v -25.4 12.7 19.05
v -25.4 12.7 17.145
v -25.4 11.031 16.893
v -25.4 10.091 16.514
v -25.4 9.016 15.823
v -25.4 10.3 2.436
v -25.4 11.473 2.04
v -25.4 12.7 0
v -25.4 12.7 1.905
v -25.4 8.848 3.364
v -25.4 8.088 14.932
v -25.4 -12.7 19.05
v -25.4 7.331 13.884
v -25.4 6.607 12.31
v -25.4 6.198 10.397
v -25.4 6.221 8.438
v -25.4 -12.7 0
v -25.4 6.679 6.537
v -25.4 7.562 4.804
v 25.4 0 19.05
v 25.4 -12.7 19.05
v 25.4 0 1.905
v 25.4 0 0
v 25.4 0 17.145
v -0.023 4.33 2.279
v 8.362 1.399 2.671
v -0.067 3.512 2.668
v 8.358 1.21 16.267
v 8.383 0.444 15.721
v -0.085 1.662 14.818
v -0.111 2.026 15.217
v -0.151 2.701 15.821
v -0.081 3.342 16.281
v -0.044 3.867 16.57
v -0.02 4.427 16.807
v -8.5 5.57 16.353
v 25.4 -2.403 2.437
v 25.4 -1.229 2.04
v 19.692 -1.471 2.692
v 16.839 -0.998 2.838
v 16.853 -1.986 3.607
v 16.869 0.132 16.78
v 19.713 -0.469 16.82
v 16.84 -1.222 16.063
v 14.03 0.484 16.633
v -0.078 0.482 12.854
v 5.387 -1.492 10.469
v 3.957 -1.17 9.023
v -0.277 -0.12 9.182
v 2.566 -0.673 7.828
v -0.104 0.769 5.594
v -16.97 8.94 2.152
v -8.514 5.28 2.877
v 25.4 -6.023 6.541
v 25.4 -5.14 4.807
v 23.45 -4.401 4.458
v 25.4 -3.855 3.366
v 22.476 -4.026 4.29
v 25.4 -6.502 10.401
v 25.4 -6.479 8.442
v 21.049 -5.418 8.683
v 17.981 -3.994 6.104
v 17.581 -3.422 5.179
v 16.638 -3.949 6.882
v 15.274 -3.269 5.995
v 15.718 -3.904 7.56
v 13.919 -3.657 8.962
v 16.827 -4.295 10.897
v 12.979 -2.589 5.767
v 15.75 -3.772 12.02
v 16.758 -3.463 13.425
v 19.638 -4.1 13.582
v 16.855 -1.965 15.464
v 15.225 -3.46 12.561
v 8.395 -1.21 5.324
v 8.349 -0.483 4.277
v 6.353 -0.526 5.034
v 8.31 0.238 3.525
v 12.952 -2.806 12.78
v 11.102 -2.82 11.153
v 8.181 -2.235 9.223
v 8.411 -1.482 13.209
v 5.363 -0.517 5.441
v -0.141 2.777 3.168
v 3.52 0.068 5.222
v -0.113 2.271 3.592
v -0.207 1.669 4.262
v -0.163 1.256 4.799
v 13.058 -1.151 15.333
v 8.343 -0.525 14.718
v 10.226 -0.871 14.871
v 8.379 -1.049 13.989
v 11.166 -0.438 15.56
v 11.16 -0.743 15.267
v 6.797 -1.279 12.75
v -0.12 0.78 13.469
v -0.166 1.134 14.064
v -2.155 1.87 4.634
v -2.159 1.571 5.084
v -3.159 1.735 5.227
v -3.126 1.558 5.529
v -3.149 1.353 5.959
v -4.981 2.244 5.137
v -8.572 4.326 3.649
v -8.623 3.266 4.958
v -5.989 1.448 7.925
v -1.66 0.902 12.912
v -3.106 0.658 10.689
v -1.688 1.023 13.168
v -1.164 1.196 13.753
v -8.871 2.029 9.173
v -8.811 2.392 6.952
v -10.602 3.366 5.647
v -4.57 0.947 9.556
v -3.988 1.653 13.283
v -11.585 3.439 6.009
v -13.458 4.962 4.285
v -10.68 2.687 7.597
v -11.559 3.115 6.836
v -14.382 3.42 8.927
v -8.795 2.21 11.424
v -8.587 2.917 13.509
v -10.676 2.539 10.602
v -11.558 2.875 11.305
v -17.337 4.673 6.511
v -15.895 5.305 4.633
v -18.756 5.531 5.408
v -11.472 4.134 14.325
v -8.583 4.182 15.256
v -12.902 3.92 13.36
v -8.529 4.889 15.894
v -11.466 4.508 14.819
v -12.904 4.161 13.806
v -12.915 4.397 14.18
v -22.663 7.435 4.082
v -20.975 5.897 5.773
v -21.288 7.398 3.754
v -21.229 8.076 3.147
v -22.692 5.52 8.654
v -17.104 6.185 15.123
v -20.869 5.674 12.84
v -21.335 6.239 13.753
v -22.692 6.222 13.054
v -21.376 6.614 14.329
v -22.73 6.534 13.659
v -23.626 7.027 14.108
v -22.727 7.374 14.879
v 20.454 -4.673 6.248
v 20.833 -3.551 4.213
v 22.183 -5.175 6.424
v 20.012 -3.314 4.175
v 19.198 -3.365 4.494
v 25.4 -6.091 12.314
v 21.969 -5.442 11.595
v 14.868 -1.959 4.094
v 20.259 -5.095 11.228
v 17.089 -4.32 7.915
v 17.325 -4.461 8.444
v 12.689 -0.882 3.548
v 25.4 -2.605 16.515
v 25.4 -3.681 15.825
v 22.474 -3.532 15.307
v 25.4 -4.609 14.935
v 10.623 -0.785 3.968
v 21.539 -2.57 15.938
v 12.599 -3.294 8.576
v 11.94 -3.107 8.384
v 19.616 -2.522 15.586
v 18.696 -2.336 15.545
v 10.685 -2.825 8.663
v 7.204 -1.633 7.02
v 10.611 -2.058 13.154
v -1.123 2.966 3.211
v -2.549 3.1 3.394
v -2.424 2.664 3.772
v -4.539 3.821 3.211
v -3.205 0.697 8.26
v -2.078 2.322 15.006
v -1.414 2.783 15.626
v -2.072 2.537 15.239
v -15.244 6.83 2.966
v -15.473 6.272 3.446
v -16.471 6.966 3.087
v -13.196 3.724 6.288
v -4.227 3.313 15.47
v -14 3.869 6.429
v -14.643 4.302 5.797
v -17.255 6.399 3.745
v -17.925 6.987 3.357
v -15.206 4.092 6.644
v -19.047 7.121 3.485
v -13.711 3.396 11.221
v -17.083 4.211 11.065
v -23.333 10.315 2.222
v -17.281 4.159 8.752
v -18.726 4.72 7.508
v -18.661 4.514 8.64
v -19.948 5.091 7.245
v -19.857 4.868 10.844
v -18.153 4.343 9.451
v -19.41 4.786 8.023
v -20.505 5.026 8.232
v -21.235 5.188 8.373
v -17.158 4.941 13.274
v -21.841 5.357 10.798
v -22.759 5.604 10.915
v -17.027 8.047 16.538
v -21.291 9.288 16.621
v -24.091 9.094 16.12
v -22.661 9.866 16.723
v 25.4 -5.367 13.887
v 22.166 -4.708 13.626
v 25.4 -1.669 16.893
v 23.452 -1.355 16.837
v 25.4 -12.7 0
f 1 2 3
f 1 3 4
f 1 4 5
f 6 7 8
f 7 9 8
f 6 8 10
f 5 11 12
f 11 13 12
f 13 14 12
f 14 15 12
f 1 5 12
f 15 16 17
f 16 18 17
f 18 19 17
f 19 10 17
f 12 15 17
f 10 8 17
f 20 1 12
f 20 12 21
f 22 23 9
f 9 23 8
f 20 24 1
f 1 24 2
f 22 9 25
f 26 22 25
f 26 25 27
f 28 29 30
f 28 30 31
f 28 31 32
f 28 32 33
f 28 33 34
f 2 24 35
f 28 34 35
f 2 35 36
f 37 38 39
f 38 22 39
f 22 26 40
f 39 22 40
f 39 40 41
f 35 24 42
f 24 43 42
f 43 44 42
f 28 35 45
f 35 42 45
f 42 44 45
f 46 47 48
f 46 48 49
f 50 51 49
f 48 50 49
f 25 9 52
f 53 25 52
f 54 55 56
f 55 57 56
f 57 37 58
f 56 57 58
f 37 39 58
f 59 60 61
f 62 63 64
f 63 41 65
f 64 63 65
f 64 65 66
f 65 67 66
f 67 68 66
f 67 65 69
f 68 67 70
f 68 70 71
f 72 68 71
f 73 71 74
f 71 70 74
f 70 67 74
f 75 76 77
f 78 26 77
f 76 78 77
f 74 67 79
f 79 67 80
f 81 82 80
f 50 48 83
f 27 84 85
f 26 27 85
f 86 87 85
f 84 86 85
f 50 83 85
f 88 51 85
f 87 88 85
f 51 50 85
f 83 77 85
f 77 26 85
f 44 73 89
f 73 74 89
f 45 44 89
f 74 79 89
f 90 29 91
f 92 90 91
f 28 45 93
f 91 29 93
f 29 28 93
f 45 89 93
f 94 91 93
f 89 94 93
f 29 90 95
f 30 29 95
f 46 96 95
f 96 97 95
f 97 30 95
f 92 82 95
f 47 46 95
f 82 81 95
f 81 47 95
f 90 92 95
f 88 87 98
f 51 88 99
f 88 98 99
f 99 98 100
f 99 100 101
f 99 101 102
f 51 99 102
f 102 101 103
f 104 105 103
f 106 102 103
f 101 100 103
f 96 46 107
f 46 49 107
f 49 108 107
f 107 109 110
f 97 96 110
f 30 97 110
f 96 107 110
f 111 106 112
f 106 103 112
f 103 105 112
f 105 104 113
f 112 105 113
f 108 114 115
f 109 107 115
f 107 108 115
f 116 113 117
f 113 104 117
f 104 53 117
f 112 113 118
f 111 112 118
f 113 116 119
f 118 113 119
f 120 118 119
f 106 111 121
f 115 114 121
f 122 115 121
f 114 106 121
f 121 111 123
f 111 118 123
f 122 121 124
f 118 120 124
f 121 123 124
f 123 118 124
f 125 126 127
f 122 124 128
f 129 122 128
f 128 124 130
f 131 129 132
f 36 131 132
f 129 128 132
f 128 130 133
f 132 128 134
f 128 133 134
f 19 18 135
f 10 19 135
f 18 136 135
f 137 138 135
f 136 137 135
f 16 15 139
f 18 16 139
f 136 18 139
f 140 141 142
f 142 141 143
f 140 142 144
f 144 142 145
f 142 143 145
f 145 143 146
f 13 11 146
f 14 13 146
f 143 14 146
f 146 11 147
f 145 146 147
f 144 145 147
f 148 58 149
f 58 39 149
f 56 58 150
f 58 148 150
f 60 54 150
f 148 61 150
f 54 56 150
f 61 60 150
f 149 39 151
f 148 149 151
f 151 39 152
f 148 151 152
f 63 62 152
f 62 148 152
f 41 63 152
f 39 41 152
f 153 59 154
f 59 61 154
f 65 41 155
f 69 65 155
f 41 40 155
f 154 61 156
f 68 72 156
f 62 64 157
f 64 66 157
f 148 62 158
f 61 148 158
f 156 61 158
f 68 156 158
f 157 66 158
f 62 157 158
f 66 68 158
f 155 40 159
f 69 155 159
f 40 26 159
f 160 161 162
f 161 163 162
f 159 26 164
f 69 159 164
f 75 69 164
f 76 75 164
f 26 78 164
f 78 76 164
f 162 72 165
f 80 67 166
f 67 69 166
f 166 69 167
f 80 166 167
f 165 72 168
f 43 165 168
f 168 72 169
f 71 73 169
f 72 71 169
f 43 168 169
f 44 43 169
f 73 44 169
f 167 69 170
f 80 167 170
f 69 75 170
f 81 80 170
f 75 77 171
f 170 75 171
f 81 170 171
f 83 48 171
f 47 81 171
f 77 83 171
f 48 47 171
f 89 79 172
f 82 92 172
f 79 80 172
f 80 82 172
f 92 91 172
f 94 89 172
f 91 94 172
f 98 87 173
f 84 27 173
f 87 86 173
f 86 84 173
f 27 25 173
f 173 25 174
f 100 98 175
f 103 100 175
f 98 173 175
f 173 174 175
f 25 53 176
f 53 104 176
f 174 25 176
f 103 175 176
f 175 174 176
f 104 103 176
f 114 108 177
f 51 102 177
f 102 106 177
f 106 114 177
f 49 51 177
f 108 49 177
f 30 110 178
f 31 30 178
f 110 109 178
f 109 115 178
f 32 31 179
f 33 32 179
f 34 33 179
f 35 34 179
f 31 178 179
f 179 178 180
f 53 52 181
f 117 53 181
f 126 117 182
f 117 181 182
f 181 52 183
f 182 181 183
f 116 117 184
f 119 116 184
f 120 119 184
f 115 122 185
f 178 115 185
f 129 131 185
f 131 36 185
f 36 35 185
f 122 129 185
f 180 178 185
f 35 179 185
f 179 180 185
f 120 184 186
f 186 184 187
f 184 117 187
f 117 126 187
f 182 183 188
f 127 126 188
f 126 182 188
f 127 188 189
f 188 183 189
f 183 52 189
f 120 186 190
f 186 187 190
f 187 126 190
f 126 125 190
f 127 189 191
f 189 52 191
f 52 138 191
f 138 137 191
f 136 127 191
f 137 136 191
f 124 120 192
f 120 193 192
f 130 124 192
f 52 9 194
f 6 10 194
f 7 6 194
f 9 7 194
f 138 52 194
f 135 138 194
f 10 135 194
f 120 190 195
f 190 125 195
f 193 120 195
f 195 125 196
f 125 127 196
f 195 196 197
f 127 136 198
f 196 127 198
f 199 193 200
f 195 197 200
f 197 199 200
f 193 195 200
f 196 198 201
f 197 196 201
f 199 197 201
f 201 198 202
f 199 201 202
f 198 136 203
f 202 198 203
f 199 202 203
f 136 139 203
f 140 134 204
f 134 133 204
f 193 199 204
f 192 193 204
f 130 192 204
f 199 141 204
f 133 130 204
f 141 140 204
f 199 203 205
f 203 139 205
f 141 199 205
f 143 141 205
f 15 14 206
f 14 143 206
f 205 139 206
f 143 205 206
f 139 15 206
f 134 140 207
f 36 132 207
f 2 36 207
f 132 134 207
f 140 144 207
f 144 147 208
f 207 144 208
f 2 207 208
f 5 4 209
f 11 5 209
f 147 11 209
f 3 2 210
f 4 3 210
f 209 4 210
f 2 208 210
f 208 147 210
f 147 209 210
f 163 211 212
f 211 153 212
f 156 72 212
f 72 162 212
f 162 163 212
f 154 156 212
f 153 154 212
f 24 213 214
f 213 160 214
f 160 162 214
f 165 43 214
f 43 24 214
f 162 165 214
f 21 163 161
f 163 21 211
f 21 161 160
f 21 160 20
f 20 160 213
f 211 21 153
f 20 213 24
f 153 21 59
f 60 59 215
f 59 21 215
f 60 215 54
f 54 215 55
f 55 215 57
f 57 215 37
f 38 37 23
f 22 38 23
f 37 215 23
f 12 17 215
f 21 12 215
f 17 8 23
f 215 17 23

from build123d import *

# Parameters (mm, degrees)
BOSS_EXTRUDE1_DEPTH = 19.05
SKETCH3_RX          = 7.62
SKETCH3_RY          = 6.35
CUT_EXTRUDE1_DEPTH  = 56.443643883


with BuildPart() as part:
    # Sketch1 → Boss-Extrude1 (new body)
    with BuildSketch(Plane.XY):
        Polygon((-25.4, 12.7), (-25.4, -12.7), (25.4, -12.7), (25.4, 0), align=None)
    extrude(amount=BOSS_EXTRUDE1_DEPTH)

    # Sketch3 → Cut-Extrude1 (cut, through all)
    with BuildSketch(Plane(origin=(-26.894117647, 6.723529412, 0), x_dir=(0, 0, -1), z_dir=(-0.9701425, 0.242535625, 0))):
        with Locations(Location((-9.525, -6.160404876), (0, 0, 0))):
            Ellipse(SKETCH3_RX, SKETCH3_RY)
    extrude(amount=-CUT_EXTRUDE1_DEPTH, mode=Mode.SUBTRACT)


solid = part.part
